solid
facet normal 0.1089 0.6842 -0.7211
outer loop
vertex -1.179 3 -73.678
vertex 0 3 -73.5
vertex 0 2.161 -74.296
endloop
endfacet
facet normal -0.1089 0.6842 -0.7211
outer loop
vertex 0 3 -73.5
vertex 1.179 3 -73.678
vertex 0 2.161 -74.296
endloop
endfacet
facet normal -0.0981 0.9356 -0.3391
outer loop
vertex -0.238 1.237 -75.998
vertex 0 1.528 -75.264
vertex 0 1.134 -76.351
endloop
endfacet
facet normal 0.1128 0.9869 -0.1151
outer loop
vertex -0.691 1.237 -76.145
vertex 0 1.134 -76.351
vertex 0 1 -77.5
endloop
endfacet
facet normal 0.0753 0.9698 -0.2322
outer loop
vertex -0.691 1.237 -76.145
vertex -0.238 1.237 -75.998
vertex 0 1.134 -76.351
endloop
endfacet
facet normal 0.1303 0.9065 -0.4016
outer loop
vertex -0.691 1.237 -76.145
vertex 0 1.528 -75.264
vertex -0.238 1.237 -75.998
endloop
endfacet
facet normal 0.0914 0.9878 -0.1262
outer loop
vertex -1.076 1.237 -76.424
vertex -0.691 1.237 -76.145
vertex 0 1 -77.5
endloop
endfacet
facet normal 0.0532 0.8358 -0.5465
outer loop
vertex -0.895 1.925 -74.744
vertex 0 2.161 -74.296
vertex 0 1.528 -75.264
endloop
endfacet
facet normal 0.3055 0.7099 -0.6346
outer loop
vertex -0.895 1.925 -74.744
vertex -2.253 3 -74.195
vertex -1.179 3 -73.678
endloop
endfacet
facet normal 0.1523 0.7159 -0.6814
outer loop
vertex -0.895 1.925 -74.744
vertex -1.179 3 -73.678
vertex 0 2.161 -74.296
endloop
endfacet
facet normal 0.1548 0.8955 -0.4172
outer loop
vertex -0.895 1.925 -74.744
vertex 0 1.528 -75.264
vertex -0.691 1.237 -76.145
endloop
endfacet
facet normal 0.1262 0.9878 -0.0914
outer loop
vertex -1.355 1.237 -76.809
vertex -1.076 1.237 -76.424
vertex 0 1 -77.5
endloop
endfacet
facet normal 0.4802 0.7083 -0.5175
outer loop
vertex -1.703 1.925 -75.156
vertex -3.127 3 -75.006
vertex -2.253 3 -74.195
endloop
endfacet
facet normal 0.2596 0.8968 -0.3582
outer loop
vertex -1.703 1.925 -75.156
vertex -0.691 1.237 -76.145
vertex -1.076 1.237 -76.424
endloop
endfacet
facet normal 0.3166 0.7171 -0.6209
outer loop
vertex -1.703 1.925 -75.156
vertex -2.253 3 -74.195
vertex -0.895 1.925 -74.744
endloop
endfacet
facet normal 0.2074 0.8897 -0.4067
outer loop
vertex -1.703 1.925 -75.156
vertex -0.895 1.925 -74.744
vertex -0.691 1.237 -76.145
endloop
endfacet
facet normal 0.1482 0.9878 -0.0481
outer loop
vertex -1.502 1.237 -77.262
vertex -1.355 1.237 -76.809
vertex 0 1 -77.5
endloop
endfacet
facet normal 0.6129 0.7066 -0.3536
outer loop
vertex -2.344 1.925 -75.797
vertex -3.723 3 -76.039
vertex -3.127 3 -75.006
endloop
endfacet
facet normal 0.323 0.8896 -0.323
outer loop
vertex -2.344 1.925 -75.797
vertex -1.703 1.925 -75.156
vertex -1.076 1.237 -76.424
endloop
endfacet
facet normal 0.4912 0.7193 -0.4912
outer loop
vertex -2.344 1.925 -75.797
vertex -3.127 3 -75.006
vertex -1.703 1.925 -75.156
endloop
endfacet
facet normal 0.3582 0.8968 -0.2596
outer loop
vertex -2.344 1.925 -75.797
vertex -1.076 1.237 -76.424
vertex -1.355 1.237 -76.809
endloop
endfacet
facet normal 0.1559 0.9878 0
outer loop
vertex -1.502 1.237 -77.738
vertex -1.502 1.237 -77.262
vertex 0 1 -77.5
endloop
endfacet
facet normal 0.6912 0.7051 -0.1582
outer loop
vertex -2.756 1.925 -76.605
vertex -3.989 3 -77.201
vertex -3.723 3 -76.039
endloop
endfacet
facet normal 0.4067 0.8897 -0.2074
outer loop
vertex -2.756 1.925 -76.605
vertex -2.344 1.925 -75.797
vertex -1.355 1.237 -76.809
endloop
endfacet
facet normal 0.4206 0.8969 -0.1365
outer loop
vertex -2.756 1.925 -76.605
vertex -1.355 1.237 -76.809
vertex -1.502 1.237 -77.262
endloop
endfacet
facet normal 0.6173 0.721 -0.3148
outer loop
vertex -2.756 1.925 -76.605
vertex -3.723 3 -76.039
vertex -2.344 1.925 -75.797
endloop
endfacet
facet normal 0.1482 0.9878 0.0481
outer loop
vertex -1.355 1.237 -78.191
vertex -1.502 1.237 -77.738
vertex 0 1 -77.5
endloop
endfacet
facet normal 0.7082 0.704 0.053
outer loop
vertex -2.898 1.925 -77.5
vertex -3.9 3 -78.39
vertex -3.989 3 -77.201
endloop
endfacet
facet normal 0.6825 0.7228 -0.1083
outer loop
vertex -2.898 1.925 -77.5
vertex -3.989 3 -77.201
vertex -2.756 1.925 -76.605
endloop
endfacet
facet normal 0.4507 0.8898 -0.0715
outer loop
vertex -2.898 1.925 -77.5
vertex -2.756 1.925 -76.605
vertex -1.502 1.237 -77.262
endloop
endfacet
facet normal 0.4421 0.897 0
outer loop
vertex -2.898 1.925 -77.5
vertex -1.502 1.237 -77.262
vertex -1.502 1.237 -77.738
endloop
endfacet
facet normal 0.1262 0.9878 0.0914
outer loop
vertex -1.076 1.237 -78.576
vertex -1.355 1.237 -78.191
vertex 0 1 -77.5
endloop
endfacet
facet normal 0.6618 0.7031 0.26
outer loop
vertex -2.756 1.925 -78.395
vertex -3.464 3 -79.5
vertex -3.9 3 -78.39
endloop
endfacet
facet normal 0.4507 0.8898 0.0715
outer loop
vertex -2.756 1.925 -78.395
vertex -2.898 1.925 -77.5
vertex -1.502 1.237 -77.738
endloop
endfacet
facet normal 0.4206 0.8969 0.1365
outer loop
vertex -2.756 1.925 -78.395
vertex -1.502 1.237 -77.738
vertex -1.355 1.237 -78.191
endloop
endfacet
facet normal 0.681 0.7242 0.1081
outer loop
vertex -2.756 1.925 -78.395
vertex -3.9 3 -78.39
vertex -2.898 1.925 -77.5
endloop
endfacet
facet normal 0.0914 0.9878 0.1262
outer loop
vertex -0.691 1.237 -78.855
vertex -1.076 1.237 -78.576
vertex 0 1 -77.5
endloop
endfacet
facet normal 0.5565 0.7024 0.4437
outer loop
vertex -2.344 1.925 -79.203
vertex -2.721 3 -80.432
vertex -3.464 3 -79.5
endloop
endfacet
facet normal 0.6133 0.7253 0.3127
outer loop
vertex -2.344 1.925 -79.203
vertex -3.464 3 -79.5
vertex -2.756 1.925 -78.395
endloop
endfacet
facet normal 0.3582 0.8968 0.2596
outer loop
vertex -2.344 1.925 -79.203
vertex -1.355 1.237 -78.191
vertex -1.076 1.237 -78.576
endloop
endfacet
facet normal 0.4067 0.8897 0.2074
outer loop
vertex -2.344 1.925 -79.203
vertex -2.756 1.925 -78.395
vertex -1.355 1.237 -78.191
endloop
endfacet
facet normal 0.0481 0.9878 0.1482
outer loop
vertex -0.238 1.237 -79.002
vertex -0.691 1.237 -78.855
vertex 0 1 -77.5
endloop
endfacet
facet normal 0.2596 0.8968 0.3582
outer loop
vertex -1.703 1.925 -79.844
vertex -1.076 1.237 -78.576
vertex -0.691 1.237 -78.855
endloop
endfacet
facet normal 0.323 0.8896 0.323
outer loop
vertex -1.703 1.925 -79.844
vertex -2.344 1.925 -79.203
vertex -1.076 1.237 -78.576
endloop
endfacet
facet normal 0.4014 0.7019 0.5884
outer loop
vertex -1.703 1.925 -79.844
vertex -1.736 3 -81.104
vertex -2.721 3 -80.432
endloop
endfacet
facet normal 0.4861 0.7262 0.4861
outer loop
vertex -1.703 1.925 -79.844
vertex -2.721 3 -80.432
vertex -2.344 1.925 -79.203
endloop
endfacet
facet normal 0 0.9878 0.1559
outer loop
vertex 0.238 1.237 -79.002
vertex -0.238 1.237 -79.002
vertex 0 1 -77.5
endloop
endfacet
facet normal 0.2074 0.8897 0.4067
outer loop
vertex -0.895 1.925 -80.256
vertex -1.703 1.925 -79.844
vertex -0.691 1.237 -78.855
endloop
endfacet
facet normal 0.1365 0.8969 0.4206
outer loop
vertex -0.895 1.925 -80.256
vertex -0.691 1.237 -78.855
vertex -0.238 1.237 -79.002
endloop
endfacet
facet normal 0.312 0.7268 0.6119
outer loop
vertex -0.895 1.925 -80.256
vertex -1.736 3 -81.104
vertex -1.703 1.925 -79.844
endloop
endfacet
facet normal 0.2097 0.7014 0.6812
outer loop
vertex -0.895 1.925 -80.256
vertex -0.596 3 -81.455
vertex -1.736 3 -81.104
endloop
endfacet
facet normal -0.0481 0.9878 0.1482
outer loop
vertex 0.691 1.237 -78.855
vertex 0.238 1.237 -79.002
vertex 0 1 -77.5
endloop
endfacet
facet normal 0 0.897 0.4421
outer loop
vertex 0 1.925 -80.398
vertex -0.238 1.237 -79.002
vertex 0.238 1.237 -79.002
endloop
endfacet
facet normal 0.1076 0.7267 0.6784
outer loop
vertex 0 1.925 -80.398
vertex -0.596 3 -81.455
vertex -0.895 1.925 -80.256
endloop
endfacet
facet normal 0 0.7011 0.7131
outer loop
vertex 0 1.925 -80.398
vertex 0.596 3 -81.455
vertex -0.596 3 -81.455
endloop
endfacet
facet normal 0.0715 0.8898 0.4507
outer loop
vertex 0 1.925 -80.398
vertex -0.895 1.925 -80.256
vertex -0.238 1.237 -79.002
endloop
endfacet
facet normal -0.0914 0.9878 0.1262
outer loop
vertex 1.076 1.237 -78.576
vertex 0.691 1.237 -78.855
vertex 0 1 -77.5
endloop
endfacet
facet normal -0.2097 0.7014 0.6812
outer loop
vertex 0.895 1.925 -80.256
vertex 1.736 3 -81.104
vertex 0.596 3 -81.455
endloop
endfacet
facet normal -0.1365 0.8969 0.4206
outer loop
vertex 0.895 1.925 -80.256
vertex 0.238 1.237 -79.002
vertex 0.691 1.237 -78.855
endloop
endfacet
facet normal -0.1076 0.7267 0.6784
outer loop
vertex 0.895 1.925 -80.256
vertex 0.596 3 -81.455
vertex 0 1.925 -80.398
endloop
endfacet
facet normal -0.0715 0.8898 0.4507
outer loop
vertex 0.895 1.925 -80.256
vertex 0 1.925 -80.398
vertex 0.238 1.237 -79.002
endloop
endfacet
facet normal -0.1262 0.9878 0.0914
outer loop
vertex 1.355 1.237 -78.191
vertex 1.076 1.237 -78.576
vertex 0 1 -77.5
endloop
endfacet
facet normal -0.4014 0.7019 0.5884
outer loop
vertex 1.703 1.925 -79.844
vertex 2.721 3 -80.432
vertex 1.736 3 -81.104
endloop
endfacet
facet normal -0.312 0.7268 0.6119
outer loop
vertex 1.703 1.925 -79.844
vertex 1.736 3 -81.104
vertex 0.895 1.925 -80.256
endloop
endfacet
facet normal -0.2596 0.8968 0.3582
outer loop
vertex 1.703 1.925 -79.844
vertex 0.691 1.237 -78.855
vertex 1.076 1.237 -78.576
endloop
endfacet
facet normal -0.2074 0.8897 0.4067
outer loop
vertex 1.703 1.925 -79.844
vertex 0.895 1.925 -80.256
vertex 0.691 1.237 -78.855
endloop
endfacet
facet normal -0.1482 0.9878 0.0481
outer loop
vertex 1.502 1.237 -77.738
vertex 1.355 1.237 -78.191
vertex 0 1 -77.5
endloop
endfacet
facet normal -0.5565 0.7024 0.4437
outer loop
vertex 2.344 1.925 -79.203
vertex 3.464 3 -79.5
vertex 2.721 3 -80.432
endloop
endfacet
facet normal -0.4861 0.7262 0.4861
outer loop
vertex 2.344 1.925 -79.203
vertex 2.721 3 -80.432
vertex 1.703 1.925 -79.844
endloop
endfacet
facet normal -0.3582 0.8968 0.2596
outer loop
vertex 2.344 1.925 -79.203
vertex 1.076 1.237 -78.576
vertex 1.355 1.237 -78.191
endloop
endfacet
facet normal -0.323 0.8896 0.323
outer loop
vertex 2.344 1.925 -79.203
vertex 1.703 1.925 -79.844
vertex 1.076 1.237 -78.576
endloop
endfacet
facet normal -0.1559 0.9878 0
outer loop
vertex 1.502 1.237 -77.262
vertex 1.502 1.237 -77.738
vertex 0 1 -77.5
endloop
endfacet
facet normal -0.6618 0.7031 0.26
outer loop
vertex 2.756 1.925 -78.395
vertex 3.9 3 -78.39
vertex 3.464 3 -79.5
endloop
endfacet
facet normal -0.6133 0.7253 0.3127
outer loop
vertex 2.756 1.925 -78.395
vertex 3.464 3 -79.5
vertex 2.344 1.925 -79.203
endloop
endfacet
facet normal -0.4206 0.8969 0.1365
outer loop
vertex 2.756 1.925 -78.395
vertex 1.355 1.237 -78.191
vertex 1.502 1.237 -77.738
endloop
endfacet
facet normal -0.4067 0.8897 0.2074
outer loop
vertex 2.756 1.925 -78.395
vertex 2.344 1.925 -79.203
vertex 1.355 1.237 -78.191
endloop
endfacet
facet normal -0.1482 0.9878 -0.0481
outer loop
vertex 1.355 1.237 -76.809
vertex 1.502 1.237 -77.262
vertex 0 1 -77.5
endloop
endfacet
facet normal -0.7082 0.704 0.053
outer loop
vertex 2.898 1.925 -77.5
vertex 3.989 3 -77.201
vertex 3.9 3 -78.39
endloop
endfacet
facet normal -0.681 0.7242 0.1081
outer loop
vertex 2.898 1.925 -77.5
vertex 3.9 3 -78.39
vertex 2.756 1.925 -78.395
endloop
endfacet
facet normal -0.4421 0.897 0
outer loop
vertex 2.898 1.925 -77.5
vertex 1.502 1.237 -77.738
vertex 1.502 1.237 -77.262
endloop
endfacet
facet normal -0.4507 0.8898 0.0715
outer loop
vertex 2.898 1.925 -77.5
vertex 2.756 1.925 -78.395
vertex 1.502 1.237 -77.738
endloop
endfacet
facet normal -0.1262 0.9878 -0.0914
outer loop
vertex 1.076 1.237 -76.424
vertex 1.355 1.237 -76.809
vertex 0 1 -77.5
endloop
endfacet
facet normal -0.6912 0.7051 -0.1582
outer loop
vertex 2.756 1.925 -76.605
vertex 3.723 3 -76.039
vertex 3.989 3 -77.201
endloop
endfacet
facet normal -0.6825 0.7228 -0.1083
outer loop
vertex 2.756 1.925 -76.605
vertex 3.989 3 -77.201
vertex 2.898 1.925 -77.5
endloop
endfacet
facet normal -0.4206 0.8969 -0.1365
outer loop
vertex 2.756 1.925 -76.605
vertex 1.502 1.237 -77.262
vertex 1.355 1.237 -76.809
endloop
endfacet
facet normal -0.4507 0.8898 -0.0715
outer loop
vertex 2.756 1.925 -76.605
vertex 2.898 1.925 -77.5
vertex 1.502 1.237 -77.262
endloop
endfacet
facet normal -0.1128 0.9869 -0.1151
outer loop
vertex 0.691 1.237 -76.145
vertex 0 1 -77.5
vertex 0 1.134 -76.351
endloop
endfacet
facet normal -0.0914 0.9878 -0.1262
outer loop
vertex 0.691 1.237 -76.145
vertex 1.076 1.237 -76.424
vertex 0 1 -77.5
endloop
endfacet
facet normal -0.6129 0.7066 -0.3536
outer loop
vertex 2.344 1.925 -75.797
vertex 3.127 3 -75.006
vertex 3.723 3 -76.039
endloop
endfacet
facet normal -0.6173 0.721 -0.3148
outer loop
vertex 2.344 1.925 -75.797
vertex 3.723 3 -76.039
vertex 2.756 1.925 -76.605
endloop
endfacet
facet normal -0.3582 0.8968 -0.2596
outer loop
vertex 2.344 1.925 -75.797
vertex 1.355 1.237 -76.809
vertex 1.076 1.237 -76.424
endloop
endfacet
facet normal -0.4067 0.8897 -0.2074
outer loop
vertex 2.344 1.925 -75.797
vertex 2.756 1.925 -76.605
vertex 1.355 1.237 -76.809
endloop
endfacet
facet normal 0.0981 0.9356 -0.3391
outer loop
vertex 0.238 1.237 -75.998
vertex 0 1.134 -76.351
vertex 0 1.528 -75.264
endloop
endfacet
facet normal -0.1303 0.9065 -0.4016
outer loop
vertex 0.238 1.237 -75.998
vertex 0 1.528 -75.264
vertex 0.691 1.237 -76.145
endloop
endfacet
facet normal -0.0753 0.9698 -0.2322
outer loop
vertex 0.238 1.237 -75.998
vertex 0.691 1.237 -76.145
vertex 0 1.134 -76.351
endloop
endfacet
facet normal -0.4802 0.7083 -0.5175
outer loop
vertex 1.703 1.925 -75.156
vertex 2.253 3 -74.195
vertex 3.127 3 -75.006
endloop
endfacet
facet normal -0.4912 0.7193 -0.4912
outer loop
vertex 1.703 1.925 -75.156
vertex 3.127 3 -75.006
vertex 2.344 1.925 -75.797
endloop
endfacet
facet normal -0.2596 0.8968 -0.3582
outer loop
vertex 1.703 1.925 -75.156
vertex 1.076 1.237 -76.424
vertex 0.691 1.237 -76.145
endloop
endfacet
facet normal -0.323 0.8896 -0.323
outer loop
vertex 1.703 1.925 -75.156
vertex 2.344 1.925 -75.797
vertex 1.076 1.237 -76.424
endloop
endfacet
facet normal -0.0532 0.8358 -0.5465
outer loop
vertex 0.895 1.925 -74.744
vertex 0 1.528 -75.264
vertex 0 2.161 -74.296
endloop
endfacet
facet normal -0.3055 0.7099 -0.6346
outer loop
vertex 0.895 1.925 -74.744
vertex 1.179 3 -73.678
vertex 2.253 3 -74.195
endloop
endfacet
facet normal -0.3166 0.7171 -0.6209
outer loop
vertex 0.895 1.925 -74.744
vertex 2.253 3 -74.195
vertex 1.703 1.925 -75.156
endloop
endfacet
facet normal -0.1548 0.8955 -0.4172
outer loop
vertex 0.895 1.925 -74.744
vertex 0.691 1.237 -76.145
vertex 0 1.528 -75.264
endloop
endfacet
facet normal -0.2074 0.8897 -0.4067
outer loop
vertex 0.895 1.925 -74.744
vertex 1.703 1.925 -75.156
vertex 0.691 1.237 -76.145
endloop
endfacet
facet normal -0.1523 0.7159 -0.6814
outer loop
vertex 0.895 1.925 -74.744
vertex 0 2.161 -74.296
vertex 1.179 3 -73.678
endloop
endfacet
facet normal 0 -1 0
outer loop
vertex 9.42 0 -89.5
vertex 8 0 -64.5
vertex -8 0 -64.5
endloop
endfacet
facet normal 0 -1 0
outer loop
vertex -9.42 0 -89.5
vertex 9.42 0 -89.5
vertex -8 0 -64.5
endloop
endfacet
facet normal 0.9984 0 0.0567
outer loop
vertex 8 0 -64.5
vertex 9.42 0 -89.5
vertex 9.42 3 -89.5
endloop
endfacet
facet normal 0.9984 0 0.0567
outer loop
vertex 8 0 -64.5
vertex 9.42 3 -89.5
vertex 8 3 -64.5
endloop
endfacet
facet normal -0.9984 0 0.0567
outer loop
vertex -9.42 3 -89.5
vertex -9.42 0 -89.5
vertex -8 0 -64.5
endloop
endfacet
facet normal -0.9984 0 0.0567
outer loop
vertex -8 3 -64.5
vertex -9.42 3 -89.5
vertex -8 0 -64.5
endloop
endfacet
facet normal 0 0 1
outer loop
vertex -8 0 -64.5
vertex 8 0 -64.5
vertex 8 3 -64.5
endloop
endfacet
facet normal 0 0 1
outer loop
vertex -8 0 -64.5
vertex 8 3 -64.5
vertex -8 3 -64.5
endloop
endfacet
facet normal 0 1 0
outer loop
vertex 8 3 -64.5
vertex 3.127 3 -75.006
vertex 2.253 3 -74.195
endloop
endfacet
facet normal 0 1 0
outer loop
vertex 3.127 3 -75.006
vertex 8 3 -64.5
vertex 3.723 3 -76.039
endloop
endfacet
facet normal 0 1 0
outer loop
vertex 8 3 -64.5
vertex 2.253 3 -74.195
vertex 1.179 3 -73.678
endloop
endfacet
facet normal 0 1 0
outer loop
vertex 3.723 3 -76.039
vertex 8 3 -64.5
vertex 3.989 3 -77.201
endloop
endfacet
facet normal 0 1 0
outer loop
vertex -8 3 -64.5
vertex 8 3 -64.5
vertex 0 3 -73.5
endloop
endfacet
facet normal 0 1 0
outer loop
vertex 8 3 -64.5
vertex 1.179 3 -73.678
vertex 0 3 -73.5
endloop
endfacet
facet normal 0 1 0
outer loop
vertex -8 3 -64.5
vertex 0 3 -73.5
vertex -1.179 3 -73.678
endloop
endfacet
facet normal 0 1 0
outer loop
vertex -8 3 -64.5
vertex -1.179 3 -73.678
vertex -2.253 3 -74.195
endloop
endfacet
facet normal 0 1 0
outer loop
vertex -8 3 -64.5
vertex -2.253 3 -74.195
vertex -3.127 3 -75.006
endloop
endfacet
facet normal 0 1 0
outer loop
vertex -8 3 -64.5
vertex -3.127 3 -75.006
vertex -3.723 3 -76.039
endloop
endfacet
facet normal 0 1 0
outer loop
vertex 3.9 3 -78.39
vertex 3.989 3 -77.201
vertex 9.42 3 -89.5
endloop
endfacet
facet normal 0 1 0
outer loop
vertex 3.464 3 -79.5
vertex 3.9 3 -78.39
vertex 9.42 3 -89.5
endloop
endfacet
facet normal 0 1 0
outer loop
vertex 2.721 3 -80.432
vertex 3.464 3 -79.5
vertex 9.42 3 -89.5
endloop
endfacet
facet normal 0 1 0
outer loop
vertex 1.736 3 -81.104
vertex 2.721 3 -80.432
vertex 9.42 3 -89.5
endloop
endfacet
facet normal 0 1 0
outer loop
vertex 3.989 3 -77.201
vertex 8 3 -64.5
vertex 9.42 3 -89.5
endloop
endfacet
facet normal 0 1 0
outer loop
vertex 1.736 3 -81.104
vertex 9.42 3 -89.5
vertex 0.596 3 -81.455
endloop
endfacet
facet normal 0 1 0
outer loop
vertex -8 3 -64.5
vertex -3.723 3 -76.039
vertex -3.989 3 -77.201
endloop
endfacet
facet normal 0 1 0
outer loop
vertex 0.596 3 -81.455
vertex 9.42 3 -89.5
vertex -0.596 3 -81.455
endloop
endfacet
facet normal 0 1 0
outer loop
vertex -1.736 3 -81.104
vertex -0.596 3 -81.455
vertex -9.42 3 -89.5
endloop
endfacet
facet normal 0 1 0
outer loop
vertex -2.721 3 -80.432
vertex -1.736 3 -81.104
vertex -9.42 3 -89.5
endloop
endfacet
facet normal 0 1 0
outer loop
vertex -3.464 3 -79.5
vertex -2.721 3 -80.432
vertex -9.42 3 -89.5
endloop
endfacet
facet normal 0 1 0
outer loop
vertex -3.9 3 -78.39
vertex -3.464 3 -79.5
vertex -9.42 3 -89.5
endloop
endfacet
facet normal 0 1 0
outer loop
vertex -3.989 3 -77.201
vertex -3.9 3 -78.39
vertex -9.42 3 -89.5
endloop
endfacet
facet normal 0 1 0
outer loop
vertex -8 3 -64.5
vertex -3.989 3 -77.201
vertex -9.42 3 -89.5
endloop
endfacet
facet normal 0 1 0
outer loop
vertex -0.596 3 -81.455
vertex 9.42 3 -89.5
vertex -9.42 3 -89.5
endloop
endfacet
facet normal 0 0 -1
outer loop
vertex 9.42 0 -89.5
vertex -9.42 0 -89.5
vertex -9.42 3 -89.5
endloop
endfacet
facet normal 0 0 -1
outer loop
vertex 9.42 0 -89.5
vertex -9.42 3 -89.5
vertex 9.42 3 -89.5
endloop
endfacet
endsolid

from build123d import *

# Parameters (mm, degrees)
BOSS_EXTRUDE1_DEPTH = 3


with BuildPart() as part:
    # Sketch1 → Boss-Extrude1 (new body)
    with BuildSketch(Plane(origin=(0, 0, 0), x_dir=(1, 0, 0), z_dir=(0, 1, 0))):
        Polygon((-9.419602878, 89.5), (-8, 64.5), (0, 64.5), (0, 89.5), align=None)
    boss_extrude1 = extrude(amount=BOSS_EXTRUDE1_DEPTH)

    # Mirror1: Boss-Extrude1 across plane
    add(boss_extrude1.mirror(Plane(origin=(0, 0, 0), x_dir=(0, 0, 1), z_dir=(1, 0, 0))))

    # Sketch2 → Cut-Revolve1 (revolve, cut)
    with BuildSketch(Plane(origin=(0, 0, 0), x_dir=(0, 0, -1), z_dir=(1, 0, 0))):
        with BuildLine():
            Line((72.5, 6), (77.5, 6))
            Line((77.5, 6), (77.5, 1))
            ThreePointArc((77.5, 1), (73.964466094, 2.464466094), (72.5, 6))
        make_face()
    revolve(axis=Axis((0, 6, -77.5), (0, -1, 0)), mode=Mode.SUBTRACT)


solid = part.part
